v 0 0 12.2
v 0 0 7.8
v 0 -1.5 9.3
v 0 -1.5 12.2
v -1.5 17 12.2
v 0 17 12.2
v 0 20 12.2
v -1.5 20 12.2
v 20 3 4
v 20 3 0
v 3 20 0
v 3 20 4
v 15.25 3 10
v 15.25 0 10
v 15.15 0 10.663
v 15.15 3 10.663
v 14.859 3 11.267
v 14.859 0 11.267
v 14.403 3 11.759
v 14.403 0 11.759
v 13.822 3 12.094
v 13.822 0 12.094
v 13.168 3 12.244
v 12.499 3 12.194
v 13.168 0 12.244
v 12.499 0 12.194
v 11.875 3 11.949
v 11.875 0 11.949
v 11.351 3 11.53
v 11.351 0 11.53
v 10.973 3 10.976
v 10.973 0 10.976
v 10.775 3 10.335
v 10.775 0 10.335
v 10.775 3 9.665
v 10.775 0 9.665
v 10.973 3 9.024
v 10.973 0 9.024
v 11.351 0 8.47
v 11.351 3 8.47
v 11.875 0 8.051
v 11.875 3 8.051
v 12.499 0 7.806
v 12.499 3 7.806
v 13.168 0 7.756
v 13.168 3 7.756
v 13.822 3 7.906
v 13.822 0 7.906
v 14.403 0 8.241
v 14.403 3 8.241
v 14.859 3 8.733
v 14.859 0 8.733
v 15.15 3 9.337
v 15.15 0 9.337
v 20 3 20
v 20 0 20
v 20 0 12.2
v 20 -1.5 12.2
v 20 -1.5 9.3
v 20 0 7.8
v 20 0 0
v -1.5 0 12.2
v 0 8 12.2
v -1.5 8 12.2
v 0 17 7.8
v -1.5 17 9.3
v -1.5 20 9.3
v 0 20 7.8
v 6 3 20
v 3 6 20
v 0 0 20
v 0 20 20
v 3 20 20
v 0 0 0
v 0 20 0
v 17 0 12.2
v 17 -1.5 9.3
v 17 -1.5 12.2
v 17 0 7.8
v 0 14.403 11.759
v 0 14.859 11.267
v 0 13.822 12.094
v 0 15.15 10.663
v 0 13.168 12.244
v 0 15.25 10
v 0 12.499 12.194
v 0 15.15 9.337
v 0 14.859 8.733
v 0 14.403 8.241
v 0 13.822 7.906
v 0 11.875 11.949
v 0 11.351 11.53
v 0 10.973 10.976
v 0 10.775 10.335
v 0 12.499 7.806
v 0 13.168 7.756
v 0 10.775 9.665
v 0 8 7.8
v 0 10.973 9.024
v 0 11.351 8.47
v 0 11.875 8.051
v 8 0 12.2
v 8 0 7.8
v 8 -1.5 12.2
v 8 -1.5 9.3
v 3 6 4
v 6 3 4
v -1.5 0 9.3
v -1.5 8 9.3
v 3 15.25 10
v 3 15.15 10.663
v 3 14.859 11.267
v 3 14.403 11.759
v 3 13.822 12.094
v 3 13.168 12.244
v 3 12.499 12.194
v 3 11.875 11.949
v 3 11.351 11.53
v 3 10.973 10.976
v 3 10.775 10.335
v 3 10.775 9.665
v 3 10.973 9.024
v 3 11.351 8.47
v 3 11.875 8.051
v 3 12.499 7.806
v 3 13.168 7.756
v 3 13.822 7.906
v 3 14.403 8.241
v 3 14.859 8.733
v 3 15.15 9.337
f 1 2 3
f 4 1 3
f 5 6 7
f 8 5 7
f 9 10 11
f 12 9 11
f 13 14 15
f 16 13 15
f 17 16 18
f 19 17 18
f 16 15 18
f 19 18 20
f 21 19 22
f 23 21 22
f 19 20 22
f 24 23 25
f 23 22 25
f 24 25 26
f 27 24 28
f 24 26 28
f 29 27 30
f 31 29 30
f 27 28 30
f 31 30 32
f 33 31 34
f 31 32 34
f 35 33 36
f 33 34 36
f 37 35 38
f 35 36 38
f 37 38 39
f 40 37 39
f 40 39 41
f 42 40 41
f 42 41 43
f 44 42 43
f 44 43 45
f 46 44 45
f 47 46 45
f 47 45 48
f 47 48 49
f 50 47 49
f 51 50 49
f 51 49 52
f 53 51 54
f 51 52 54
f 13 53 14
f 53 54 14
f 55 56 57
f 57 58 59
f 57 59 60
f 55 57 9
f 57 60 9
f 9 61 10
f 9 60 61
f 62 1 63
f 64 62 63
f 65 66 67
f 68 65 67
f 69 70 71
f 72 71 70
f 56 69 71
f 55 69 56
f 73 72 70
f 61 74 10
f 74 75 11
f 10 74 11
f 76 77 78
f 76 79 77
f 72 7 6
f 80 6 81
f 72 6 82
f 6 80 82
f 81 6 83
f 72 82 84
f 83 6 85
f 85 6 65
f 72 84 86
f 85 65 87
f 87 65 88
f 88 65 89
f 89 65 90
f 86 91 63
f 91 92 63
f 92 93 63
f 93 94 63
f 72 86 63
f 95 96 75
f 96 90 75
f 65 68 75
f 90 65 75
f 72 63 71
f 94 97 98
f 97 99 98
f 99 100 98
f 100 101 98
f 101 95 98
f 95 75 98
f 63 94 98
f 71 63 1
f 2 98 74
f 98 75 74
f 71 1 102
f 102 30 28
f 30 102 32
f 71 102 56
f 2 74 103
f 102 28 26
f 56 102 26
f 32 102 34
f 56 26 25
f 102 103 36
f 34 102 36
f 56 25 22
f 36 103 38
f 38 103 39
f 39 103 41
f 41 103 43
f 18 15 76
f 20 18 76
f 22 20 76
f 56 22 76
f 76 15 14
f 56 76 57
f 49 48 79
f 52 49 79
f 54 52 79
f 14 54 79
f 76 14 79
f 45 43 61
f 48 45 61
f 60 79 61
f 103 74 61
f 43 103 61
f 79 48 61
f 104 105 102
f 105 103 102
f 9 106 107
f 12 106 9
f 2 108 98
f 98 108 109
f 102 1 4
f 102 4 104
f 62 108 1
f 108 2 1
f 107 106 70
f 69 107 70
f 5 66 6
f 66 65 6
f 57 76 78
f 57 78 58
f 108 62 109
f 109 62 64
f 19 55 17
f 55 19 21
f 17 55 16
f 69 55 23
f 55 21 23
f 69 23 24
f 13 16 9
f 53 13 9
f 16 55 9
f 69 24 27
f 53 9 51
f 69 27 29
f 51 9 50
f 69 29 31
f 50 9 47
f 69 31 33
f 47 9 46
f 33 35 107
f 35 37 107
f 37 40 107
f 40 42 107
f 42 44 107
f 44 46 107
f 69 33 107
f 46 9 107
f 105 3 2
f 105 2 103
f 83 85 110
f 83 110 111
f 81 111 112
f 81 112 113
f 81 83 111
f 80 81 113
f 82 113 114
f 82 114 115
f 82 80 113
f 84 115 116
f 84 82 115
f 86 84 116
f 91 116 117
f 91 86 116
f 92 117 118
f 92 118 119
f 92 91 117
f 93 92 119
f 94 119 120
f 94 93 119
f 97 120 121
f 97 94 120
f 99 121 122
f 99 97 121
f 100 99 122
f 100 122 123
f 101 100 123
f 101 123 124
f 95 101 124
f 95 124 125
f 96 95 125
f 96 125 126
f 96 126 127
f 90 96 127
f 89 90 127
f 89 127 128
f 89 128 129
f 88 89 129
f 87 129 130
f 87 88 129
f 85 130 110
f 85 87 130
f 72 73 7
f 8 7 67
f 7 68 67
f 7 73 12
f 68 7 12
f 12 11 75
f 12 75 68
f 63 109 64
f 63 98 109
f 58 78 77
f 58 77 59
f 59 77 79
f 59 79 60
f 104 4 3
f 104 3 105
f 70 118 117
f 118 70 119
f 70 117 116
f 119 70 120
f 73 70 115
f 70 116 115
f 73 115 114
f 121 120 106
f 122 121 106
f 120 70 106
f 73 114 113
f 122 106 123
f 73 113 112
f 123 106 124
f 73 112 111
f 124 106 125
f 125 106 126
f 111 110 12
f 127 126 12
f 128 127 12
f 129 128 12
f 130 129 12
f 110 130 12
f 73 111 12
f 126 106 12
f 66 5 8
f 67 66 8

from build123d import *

# Parameters (mm, degrees)
F1_DEPTH = 20
F2_DEPTH = 4
F3_R     = 2.25
F4_DEPTH = 3
F3_W     = 8
F3_H     = 4.4
F3_W_2   = 3
F5_DEPTH = 1.5
F6_SIZE  = 1.49999
F8_SIZE  = 3


# Not quite as in the source:
# - a fillet or chamfer is up to 0.001 mm smaller than in the source, because OpenCascade refuses the exact size
# - a pattern or mirror of a feature is missing from the dataset's text; its kind, count and spacing are read off the source's solid


with BuildPart() as f1:
    # F0 (on Top) → F1 (new body)
    with BuildSketch(Plane.XY):
        Polygon((0, 20), (0, 0), (20, 0), (20, 3), (3, 3), (3, 20), align=None)
    extrude(amount=F1_DEPTH)

    # F0 (on Top) → F2 (join)
    with BuildSketch(Plane.XY):
        Polygon((3, 3), (20, 3), (3, 20), align=None)
    extrude(amount=F2_DEPTH)

    # F3 (on face) → F4 (cut, through all)
    with BuildSketch(Plane.XZ):
        with Locations((13, 10)):
            Circle(F3_R)
    f4 = extrude(amount=-F4_DEPTH, mode=Mode.SUBTRACT)

    # F4_copies: F4 across plane
    add(f4.mirror(Plane(origin=(0, 0, 0), x_dir=(-0.7071067812, -0.7071067812, 0), z_dir=(-0.7071067812, 0.7071067812, 0))), mode=Mode.SUBTRACT)

    # F3 (on face) → F5 (join)
    with BuildSketch(Plane.XZ):
        with Locations((4, 10)):
            Rectangle(F3_W, F3_H)
        with Locations((18.5, 10)):
            Rectangle(F3_W_2, F3_H)
    f5 = extrude(amount=F5_DEPTH)

    # F5_copies: F5 across plane
    add(f5.mirror(Plane(origin=(0, 0, 0), x_dir=(0.7071067812, 0.7071067812, 0), z_dir=(-0.7071067812, 0.7071067812, 0))))

    # F6 (size 1.5 in the source; OpenCascade refuses exactly that, so slightly less here)
    f6_edges = [f1.edges().sort_by_distance(p)[0] for p in [
        (4, -1.5, 7.8),
        (18.5, -1.5, 7.8),
        (-1.5, 4, 7.8),
        (-1.5, 18.5, 7.8),
    ]]
    chamfer(f6_edges, length=F6_SIZE)

    # F8
    f8_edges = [f1.edges().sort_by_distance(p)[0] for p in [
        (3, 3, 12),
    ]]
    chamfer(f8_edges, length=F8_SIZE)


solid = f1.part
